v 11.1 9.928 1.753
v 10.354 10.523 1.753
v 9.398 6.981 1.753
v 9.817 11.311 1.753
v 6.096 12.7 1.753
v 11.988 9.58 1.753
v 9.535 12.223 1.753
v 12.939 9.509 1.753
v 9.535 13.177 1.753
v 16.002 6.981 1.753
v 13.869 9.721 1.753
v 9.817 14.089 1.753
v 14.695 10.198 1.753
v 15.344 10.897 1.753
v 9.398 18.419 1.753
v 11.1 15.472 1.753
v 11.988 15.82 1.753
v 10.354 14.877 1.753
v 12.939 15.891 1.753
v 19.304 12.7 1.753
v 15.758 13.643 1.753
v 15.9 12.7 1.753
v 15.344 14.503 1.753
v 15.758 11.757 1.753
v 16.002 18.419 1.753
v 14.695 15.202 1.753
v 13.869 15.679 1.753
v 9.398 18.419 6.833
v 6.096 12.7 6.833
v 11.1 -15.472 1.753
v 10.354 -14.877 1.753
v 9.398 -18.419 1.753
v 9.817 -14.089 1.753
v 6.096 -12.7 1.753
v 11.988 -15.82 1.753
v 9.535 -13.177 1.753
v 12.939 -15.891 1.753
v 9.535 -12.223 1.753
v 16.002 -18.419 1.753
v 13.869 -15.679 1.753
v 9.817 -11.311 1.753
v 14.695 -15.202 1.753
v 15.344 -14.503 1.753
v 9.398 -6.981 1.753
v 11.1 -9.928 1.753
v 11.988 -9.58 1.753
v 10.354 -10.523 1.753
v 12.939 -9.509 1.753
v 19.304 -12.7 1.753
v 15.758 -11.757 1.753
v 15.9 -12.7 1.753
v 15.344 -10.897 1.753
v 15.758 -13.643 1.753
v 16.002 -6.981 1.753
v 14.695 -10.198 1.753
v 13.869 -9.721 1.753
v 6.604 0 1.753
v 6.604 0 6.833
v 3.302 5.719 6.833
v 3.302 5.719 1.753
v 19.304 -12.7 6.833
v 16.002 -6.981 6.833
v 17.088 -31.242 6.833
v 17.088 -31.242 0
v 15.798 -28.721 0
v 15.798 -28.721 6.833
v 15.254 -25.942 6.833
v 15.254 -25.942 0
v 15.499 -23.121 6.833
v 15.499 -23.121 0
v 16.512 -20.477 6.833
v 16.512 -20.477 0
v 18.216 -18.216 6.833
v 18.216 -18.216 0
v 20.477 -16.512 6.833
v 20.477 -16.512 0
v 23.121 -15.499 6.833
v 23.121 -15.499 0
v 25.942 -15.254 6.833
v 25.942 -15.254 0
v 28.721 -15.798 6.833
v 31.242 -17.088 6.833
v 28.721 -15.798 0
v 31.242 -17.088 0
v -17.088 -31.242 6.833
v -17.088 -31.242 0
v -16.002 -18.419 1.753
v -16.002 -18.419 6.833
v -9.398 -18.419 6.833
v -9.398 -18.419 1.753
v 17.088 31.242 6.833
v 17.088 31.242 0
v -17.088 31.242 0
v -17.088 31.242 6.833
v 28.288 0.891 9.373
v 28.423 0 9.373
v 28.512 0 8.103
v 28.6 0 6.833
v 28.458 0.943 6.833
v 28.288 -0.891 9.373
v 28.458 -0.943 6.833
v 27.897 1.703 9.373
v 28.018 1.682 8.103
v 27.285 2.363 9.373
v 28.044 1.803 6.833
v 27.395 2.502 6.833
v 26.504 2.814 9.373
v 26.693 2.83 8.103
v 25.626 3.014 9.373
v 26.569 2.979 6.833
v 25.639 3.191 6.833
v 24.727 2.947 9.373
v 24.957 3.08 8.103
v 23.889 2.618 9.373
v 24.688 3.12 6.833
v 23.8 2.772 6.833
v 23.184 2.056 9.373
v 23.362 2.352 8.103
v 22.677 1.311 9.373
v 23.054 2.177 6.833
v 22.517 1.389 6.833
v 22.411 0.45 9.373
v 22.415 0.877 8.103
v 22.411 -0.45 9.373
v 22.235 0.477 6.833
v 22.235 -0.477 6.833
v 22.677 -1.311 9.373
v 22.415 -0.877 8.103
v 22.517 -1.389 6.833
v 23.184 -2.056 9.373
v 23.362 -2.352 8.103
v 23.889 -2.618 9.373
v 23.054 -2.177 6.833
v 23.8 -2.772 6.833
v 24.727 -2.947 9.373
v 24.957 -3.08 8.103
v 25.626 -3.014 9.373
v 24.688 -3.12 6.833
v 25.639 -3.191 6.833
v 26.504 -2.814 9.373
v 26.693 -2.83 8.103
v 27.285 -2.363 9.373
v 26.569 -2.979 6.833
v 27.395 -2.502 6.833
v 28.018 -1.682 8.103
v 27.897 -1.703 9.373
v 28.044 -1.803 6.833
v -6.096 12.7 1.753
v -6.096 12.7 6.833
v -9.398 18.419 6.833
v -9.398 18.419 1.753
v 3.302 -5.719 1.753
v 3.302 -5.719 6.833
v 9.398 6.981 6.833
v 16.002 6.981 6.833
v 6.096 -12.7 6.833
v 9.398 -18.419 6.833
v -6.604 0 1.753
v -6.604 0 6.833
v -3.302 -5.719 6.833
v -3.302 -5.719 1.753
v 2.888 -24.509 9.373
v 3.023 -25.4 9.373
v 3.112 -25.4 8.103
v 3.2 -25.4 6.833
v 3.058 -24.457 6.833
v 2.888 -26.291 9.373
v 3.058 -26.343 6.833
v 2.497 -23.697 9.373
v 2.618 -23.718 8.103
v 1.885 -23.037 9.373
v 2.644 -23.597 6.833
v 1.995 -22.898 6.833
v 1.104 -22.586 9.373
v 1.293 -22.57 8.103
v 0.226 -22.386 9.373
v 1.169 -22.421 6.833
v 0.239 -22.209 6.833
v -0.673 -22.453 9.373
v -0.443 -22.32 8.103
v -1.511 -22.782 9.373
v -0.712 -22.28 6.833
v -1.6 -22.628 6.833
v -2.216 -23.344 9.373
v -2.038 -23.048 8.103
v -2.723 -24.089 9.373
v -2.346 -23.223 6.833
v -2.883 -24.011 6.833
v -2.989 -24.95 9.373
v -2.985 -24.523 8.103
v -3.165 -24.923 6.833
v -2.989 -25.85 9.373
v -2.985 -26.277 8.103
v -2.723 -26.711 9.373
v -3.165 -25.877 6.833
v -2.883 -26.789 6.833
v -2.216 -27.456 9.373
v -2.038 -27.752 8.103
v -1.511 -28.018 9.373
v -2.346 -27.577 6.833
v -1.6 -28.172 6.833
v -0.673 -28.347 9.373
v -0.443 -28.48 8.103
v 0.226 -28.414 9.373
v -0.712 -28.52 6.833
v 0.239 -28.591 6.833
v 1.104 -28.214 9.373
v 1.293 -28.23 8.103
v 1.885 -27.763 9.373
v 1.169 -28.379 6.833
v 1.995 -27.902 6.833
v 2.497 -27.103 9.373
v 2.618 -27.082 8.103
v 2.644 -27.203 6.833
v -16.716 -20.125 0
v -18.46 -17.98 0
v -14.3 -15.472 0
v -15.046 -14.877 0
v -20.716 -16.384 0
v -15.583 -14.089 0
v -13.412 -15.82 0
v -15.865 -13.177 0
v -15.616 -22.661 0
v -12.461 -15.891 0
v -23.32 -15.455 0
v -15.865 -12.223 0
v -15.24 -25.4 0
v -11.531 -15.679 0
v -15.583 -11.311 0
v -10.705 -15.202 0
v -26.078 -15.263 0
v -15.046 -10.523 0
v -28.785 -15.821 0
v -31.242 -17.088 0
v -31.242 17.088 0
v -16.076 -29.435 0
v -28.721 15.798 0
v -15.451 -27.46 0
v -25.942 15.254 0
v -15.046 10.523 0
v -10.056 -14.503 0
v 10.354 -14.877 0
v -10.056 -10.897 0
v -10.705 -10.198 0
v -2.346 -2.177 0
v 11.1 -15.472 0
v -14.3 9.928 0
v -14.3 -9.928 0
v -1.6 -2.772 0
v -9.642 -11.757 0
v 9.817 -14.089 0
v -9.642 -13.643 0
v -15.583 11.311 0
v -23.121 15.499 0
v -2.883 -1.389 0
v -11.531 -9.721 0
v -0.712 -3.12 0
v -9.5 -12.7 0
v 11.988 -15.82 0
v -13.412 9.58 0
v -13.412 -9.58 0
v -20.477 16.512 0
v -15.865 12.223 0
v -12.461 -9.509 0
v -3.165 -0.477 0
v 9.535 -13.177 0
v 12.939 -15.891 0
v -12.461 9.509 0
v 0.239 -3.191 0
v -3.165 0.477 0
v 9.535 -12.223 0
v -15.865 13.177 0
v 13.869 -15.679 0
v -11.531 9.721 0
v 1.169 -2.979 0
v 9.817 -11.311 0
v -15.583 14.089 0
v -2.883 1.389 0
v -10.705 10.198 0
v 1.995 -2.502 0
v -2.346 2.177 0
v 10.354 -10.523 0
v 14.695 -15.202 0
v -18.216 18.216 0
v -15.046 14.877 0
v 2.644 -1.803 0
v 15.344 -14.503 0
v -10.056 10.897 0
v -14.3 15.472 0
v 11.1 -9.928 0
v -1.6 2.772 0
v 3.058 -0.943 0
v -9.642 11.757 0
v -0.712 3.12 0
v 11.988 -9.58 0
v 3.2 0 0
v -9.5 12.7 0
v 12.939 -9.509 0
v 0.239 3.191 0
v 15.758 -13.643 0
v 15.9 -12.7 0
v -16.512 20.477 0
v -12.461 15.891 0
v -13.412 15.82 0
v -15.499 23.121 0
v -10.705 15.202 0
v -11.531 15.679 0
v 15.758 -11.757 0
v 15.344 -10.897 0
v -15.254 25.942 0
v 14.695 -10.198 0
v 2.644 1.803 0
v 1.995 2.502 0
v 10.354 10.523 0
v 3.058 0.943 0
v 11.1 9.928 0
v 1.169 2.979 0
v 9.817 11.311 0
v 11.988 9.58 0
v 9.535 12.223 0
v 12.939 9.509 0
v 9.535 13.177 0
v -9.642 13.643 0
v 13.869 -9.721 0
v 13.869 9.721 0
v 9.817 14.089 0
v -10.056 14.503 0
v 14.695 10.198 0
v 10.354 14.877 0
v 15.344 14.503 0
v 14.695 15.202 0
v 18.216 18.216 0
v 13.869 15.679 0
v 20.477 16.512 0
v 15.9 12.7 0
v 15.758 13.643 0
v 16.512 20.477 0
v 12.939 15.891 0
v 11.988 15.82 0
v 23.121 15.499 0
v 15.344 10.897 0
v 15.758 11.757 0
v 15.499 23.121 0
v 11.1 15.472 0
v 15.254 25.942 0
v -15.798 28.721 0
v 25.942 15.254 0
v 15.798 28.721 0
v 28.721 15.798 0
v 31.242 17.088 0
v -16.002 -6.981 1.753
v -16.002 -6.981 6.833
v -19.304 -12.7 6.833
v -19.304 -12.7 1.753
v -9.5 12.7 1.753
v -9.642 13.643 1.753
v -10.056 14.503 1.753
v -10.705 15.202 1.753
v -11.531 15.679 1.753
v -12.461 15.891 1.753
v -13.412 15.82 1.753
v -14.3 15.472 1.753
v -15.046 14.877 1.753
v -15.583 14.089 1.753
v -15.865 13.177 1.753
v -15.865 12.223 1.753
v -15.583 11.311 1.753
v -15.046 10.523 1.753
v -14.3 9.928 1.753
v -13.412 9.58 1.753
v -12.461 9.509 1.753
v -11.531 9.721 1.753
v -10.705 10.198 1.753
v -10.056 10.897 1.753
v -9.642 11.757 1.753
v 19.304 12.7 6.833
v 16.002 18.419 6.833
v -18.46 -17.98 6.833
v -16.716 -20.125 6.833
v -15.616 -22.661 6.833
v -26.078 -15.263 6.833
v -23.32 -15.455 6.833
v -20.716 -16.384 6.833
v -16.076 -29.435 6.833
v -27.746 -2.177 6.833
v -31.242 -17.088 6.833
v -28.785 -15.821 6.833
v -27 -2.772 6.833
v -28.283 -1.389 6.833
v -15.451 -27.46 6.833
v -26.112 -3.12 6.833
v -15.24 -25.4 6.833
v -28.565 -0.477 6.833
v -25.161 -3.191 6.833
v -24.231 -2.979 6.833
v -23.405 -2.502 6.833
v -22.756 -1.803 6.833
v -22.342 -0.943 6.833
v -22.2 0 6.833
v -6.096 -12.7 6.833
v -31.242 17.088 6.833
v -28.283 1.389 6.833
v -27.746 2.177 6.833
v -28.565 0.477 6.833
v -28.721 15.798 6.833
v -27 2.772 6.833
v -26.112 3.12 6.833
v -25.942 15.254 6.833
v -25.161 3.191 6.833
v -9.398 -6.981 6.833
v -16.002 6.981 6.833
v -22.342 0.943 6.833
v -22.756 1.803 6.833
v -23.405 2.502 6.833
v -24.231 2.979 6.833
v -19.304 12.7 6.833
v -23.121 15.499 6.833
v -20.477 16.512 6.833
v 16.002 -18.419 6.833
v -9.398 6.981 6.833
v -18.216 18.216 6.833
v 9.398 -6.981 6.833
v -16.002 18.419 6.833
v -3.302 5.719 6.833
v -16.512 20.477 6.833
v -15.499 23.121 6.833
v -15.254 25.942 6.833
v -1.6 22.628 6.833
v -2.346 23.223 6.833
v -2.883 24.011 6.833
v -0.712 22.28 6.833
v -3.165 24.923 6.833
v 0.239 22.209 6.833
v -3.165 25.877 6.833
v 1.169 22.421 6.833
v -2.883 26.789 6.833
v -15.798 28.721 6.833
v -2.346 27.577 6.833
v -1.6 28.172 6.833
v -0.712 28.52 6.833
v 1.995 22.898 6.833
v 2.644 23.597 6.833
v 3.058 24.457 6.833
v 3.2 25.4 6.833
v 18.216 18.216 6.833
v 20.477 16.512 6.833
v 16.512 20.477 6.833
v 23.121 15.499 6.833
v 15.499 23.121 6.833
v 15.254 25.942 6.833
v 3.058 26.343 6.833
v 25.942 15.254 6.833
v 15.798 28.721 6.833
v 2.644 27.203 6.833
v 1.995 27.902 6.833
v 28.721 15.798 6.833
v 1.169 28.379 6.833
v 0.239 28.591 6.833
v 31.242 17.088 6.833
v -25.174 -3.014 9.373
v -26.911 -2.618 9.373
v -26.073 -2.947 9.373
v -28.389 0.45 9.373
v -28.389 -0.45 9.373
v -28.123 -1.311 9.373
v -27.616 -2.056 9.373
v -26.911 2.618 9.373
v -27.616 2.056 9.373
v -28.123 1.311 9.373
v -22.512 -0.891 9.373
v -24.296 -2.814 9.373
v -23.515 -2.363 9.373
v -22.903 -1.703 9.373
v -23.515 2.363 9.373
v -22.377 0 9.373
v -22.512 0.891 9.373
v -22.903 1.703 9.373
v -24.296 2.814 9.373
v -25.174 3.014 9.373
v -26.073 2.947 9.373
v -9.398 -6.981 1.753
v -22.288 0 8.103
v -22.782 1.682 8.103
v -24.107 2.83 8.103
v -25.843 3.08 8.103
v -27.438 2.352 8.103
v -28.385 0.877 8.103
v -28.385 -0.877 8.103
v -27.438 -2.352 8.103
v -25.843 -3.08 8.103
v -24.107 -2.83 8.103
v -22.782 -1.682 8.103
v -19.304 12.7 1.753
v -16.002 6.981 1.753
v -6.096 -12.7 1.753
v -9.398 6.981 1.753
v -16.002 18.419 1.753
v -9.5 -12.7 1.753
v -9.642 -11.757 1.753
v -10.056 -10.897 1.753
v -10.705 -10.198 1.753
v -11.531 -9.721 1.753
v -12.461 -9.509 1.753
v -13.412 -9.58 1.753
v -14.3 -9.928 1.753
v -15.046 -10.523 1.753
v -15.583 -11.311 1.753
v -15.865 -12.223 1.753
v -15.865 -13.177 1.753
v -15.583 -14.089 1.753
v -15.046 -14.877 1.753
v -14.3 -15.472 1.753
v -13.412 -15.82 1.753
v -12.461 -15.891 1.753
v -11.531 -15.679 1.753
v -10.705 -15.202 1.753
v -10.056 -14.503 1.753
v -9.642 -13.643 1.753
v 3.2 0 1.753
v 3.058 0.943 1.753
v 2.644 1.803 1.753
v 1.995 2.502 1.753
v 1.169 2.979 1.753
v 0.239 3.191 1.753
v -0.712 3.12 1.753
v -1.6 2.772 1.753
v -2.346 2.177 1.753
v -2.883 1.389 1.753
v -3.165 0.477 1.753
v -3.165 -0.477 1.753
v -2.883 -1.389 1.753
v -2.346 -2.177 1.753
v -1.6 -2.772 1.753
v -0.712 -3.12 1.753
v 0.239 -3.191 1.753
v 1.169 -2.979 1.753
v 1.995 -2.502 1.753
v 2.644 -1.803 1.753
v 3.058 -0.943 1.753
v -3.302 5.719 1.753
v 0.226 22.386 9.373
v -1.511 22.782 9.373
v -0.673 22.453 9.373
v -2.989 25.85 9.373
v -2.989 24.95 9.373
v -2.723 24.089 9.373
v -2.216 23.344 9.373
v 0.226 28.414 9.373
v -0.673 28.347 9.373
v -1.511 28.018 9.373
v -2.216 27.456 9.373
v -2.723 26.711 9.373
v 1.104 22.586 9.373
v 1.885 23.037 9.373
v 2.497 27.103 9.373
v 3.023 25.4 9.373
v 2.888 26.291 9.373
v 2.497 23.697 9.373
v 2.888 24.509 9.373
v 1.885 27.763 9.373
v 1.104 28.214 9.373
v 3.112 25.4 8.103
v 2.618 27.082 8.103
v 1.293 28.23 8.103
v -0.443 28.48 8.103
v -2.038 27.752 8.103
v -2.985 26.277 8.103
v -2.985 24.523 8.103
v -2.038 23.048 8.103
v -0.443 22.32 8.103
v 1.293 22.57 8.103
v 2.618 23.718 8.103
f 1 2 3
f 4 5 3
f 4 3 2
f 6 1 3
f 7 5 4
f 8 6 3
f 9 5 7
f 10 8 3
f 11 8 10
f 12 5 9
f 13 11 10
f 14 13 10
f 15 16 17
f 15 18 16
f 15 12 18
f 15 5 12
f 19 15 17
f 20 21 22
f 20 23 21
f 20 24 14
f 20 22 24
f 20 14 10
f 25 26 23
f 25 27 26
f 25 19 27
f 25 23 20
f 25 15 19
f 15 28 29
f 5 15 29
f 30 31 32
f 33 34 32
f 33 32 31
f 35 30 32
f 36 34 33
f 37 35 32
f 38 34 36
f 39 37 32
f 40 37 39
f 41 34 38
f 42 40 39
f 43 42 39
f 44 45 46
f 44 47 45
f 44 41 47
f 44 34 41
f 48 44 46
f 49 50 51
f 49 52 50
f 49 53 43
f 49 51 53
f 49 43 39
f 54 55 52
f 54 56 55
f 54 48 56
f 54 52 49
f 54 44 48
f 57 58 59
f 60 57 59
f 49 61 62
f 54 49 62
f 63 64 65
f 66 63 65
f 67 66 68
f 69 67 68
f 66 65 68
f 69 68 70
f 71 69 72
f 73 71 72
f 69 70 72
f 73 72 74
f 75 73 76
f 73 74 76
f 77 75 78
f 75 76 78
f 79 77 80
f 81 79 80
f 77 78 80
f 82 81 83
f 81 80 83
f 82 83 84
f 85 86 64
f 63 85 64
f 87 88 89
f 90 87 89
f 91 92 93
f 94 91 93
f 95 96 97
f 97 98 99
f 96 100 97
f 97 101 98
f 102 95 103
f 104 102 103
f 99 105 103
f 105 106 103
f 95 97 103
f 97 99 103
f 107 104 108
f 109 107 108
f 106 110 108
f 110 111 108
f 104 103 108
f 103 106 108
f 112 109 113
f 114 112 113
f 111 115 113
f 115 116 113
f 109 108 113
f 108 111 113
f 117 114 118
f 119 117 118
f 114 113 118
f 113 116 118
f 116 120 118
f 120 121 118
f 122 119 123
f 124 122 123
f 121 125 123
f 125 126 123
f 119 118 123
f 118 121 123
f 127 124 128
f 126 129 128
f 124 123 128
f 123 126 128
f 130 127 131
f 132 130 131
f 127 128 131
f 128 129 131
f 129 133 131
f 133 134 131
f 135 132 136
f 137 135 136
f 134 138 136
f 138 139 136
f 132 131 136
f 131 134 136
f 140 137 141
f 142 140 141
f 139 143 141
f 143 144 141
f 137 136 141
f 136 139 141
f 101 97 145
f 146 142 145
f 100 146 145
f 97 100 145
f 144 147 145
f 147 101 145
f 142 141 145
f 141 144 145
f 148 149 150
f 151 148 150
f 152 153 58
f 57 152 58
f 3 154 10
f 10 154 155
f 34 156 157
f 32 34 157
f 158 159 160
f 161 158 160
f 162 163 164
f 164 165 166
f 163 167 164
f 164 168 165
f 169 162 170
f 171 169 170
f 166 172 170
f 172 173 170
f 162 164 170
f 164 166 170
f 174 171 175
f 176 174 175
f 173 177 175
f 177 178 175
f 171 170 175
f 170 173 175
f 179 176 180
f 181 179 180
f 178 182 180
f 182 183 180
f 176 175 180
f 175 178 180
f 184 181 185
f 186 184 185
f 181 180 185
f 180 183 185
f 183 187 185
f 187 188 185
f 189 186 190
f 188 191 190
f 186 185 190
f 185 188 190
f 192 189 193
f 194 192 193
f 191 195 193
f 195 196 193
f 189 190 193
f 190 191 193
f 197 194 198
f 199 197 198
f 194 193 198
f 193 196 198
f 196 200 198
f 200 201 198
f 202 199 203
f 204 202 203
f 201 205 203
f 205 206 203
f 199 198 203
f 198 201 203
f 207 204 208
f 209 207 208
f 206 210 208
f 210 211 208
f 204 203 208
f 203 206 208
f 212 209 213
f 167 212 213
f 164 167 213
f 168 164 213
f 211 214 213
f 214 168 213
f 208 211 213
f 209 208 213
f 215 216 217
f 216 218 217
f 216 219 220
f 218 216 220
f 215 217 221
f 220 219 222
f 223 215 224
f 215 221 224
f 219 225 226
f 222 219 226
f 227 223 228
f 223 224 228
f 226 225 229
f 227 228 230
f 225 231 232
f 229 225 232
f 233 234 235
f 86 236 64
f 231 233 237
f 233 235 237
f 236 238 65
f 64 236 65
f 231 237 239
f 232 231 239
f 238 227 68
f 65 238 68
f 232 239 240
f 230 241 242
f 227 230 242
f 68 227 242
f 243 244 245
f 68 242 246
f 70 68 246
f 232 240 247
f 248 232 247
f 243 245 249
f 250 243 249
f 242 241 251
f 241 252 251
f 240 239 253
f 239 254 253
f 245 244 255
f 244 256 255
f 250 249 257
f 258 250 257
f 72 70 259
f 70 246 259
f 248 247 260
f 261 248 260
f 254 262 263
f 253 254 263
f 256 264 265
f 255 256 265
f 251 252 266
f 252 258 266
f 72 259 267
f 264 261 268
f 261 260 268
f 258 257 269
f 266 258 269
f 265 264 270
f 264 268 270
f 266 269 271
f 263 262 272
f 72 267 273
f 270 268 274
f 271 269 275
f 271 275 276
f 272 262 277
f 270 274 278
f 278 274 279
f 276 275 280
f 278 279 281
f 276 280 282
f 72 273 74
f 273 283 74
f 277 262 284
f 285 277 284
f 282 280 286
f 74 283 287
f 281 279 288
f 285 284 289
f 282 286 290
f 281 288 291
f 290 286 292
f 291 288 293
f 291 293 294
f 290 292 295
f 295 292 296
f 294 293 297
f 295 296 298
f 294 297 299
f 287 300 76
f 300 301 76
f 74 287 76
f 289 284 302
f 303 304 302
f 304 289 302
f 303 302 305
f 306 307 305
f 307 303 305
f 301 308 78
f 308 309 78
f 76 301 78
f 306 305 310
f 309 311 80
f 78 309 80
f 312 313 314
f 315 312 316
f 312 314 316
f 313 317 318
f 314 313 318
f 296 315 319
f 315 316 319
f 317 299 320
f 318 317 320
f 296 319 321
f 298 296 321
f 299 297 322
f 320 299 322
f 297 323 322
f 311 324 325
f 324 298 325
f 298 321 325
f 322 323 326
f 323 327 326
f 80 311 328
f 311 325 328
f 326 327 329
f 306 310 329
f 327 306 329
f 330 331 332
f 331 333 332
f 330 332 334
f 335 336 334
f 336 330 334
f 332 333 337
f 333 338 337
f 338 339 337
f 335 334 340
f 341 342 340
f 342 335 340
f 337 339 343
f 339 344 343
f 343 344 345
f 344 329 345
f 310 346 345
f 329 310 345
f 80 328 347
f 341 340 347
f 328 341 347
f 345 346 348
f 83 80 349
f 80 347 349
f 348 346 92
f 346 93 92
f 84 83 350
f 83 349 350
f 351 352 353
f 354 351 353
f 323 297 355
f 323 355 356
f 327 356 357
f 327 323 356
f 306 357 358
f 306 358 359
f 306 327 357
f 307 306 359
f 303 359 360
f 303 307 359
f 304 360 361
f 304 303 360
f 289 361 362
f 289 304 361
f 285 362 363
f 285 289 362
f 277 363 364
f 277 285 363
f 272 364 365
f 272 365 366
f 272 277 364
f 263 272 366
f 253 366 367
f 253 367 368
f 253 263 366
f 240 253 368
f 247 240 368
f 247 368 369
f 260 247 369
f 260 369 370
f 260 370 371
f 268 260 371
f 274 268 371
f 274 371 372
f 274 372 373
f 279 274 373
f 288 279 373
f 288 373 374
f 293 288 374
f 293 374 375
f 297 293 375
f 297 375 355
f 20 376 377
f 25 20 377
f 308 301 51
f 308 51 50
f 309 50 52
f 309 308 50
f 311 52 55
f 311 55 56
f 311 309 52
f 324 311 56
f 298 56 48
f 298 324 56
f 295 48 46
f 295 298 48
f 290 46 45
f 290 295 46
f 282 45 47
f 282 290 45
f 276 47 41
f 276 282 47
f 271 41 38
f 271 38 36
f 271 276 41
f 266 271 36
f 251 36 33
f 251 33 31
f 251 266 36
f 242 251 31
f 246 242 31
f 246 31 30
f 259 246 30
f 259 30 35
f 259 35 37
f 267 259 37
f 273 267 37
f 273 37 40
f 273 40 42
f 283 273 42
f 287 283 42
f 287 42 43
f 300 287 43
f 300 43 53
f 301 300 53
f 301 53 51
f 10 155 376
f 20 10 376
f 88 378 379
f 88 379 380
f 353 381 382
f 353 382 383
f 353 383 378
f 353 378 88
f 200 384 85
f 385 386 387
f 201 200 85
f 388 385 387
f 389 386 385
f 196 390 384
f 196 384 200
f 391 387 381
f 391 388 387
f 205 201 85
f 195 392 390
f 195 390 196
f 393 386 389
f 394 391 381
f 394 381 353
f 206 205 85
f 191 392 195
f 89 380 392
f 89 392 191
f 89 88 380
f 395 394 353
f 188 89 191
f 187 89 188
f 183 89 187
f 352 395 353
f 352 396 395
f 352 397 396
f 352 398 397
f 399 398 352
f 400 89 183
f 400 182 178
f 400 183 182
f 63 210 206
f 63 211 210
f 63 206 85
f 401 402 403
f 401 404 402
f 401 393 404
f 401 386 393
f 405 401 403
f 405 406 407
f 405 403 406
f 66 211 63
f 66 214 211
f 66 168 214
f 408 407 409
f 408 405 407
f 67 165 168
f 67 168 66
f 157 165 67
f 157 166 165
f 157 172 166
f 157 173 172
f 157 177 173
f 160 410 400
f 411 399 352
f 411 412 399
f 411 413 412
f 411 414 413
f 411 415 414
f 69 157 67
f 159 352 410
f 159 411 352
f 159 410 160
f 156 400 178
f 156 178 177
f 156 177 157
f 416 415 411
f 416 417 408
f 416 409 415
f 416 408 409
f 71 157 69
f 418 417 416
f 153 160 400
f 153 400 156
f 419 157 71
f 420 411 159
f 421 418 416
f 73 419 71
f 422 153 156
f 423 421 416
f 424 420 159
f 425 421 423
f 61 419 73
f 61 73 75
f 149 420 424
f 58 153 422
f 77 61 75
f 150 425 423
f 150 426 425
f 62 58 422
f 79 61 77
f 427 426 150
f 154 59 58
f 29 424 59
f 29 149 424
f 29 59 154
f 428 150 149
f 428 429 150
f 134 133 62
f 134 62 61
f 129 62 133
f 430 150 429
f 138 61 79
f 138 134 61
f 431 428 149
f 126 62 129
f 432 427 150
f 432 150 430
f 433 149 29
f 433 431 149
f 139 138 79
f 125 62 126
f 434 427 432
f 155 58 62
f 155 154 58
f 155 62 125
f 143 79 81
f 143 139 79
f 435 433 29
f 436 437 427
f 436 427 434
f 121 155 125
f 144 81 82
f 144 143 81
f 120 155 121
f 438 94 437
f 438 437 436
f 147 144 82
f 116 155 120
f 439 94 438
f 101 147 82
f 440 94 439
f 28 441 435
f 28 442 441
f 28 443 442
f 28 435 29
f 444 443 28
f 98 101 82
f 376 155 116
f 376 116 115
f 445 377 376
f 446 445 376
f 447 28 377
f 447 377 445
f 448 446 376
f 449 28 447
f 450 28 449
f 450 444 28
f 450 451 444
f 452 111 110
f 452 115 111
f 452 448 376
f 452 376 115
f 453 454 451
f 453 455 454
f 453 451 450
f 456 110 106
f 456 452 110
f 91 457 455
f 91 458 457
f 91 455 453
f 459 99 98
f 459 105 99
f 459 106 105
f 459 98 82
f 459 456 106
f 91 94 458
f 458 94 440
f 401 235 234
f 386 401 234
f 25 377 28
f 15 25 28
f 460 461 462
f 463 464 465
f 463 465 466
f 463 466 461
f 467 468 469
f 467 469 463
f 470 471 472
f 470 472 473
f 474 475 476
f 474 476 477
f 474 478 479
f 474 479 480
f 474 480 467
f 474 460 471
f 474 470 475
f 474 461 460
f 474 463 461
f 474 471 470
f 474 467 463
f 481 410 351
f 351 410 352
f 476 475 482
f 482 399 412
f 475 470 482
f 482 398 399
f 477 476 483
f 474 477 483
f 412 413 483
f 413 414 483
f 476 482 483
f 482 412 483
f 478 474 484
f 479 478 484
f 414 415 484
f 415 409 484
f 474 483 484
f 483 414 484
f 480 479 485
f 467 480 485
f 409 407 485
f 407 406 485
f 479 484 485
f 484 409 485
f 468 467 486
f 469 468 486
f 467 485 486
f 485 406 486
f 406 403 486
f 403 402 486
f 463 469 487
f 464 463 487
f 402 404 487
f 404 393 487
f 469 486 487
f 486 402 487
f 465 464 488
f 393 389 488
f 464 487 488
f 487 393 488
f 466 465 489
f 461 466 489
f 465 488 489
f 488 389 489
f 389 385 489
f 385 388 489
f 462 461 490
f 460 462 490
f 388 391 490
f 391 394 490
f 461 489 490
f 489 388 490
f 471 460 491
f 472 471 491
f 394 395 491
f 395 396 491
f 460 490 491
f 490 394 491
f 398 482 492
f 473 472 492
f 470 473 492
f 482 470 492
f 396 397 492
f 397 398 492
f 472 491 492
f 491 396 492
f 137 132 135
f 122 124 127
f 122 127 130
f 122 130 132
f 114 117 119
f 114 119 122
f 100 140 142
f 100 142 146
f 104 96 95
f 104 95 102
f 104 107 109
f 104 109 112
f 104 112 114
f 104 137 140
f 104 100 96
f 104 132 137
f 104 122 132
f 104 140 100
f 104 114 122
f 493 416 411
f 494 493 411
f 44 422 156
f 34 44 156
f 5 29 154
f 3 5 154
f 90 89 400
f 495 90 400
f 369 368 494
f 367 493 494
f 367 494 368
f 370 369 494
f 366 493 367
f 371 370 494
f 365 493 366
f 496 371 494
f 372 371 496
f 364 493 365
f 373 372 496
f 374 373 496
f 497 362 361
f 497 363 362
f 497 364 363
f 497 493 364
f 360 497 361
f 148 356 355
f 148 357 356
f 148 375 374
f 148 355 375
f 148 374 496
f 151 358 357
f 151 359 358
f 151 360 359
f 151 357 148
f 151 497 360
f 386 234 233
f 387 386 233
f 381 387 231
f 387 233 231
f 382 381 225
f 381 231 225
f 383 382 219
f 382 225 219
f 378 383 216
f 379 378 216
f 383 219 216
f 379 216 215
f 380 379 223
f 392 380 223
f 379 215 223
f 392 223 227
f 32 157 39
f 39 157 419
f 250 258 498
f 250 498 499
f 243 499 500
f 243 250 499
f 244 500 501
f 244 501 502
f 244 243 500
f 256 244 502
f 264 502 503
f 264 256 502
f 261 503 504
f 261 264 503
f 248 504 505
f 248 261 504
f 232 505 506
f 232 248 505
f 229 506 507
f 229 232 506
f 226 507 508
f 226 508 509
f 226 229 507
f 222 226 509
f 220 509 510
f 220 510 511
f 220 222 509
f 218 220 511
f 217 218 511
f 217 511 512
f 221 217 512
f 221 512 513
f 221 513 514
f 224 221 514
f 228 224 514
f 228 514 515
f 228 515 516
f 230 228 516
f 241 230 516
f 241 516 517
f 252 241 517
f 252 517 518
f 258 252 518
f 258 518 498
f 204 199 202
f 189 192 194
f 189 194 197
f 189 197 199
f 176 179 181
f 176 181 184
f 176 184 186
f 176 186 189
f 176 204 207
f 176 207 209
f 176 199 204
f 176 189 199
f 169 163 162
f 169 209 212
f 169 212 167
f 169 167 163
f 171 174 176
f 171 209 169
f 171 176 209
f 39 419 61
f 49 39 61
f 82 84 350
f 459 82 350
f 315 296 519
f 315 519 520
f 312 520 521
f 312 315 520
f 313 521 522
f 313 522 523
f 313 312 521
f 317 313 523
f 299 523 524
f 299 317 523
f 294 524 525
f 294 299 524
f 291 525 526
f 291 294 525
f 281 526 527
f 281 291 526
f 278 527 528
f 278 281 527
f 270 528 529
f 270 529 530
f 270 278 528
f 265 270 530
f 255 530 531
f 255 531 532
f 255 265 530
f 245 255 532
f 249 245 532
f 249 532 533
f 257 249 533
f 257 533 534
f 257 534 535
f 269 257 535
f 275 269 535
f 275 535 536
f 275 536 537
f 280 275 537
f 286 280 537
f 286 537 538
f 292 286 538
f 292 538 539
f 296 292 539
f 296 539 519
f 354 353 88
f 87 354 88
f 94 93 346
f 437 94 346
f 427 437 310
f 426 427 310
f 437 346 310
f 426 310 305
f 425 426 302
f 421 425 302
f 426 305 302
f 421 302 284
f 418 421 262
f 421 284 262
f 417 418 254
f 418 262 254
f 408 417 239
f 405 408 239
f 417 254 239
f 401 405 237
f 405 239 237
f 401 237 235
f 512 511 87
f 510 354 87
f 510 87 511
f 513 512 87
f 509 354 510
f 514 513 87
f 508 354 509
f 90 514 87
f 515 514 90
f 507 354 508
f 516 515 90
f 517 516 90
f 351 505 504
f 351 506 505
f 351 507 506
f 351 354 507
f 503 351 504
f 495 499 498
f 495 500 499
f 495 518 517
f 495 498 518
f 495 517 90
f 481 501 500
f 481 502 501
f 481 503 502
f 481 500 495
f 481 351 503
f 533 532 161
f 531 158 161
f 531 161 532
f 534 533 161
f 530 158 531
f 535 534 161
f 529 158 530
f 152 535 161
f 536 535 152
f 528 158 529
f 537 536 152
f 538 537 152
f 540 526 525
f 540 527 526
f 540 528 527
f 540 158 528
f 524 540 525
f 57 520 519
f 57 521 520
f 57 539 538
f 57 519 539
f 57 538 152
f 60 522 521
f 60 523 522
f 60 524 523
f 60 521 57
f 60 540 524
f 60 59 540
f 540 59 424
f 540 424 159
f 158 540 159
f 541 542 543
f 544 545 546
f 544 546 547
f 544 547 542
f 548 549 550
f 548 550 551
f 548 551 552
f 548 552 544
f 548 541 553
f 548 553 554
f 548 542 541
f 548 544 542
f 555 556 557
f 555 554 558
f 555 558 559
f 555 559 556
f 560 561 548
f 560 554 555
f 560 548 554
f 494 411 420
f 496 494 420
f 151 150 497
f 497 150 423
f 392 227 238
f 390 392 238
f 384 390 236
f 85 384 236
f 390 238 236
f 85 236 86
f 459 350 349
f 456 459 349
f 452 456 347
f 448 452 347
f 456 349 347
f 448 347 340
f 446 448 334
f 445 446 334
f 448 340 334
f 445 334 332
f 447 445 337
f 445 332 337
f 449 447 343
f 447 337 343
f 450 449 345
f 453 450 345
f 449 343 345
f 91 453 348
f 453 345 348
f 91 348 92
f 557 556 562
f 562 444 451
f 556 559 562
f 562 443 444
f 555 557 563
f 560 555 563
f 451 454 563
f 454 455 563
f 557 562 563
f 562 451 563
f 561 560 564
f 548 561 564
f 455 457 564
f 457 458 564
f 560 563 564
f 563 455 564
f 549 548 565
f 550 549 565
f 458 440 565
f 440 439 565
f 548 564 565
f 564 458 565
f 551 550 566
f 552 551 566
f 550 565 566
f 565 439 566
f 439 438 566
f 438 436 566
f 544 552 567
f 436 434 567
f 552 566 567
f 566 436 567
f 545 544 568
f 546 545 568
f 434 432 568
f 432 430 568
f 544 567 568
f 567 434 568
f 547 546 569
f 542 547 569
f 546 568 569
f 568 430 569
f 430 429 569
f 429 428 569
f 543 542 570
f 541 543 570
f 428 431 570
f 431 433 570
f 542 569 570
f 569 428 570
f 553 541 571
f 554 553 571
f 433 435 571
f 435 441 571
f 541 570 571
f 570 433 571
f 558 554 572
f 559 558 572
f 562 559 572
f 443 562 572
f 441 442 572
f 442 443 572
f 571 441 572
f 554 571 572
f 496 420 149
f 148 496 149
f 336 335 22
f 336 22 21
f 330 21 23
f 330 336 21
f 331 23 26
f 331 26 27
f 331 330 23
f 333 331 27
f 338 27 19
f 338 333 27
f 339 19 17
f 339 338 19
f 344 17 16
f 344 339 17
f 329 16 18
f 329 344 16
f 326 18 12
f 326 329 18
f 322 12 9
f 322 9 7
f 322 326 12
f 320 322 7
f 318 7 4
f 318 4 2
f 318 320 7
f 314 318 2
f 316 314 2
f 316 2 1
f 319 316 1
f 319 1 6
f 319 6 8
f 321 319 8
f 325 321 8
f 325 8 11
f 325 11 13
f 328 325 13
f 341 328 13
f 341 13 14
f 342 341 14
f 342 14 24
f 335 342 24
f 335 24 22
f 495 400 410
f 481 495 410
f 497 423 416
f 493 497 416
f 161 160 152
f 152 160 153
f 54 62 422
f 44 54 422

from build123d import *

# Parameters (mm, degrees)
F0_R       = 3.2004
F0_R_2     = 6.858
F1_DEPTH   = 6.8326
F2_DEPTH   = 9.3726
F3_R       = 3.2004
F4_DEPTH   = 5.08
F5_SIZE2   = 2.53999
F5_SIZE    = 0.17779
F5_2_SIZE2 = 2.53999
F5_2_SIZE  = 0.17779
F5_3_SIZE2 = 2.53999
F5_3_SIZE  = 0.17779
F5_4_SIZE2 = 2.53999
F5_4_SIZE  = 0.17779


# Not quite as in the source:
# - a fillet or chamfer is up to 0.001 mm smaller than in the source, because OpenCascade refuses the exact size


with BuildPart() as f1:
    # F0 (on Top) → F1 (new body)
    with BuildSketch(Plane.XY):
        with BuildLine():
            ThreePointArc((-31.242, -17.0875613686), (-20.7164714157, -16.3838944106), (-15.24, -25.4))
            ThreePointArc((-15.24, -25.4), (-15.712895776, -28.4635945803), (-17.0875613686, -31.242))
            Line((-17.0875613686, -31.242), (17.0875613686, -31.242))
            ThreePointArc((17.0875613686, -31.242), (18.2157951031, -18.2157951031), (31.242, -17.0875613686))
            Line((31.242, -17.0875613686), (31.242, 17.0875613686))
            ThreePointArc((31.242, 17.0875613686), (18.2157951031, 18.2157951031), (17.0875613686, 31.242))
            Line((17.0875613686, 31.242), (-17.0875613686, 31.242))
            ThreePointArc((-17.0875613686, 31.242), (-18.2157951031, 18.2157951031), (-31.242, 17.0875613686))
            Line((-31.242, 17.0875613686), (-31.242, -17.0875613686))
        make_face()
        with Locations((0, -25.4)):
            Circle(F0_R, mode=Mode.SUBTRACT)
        with Locations((-25.4, 0)):
            Circle(F0_R, mode=Mode.SUBTRACT)
        with Locations((-12.7, -12.7)):
            Circle(F0_R, mode=Mode.SUBTRACT)
        Circle(F0_R_2, mode=Mode.SUBTRACT)
        with Locations((12.7, -12.7)):
            Circle(F0_R, mode=Mode.SUBTRACT)
        with Locations((25.4, 0)):
            Circle(F0_R, mode=Mode.SUBTRACT)
        with Locations((-12.7, 12.7)):
            Circle(F0_R, mode=Mode.SUBTRACT)
        with Locations((0, 25.4)):
            Circle(F0_R, mode=Mode.SUBTRACT)
        with Locations((12.7, 12.7)):
            Circle(F0_R, mode=Mode.SUBTRACT)
        Circle(F0_R_2)
        Circle(F0_R, mode=Mode.SUBTRACT)
    extrude(amount=F1_DEPTH)

    # F0 (on Top) → F2 (join)
    with BuildSketch(Plane.XY):
        with Locations((-25.4, 0)):
            Circle(F0_R)
        with Locations((0, -25.4)):
            Circle(F0_R)
        with Locations((25.4, 0)):
            Circle(F0_R)
        with Locations((0, 25.4)):
            Circle(F0_R)
    extrude(amount=F2_DEPTH)

    # F3 (on face) → F4 (cut)
    with BuildSketch(Plane.XY.offset(6.8326)):
        Polygon((-9.398, 6.9807682334), (-6.096, 12.7), (-9.398, 18.4192317666), (-16.002, 18.4192317666), (-19.304, 12.7), (-16.002, 6.9807682334), align=None)
        with Locations((-12.7, 12.7)):
            Circle(F3_R, mode=Mode.SUBTRACT)
        Polygon((9.398, 18.4192317666), (6.096, 12.7), (9.398, 6.9807682334), (16.002, 6.9807682334), (19.304, 12.7), (16.002, 18.4192317666), align=None)
        with Locations((12.7, 12.7)):
            Circle(F3_R, mode=Mode.SUBTRACT)
        Polygon((-9.398, -18.4192317666), (-6.096, -12.7), (-9.398, -6.9807682334), (-16.002, -6.9807682334), (-19.304, -12.7), (-16.002, -18.4192317666), align=None)
        with Locations((-12.7, -12.7)):
            Circle(F3_R, mode=Mode.SUBTRACT)
        Polygon((9.398, -6.9807682334), (6.096, -12.7), (9.398, -18.4192317666), (16.002, -18.4192317666), (19.304, -12.7), (16.002, -6.9807682334), align=None)
        with Locations((12.7, -12.7)):
            Circle(F3_R, mode=Mode.SUBTRACT)
        Polygon((3.302, -5.7192317666), (6.604, 0), (3.302, 5.7192317666), (-3.302, 5.7192317666), (-6.604, 0), (-3.302, -5.7192317666), align=None)
        Circle(F3_R, mode=Mode.SUBTRACT)
    extrude(amount=-F4_DEPTH, mode=Mode.SUBTRACT)

    # F5 (size 0.1778 and 2.54 in the source; OpenCascade refuses exactly that, so slightly less here)
    f5_edges = [f1.edges().sort_by_distance(p)[0] for p in [
        (-28.6004, 0, 9.3726),
    ]]
    f5_side = f1.faces().sort_by_distance((-25.4, 0, 9.3726))[0]
    chamfer(f5_edges, length=F5_SIZE, length2=F5_SIZE2, reference=f5_side)

    # F5#2 (size 0.1778 and 2.54 in the source; OpenCascade refuses exactly that, so slightly less here)
    f5_2_edges = [f1.edges().sort_by_distance(p)[0] for p in [
        (-3.2004, 25.4, 9.3726),
    ]]
    f5_2_side = f1.faces().sort_by_distance((0, 25.4, 9.3726))[0]
    chamfer(f5_2_edges, length=F5_2_SIZE, length2=F5_2_SIZE2, reference=f5_2_side)

    # F5#3 (size 0.1778 and 2.54 in the source; OpenCascade refuses exactly that, so slightly less here)
    f5_3_edges = [f1.edges().sort_by_distance(p)[0] for p in [
        (22.1996, 0, 9.3726),
    ]]
    f5_3_side = f1.faces().sort_by_distance((25.4, 0, 9.3726))[0]
    chamfer(f5_3_edges, length=F5_3_SIZE, length2=F5_3_SIZE2, reference=f5_3_side)

    # F5#4 (size 0.1778 and 2.54 in the source; OpenCascade refuses exactly that, so slightly less here)
    f5_4_edges = [f1.edges().sort_by_distance(p)[0] for p in [
        (-3.2004, -25.4, 9.3726),
    ]]
    f5_4_side = f1.faces().sort_by_distance((0, -25.4, 9.3726))[0]
    chamfer(f5_4_edges, length=F5_4_SIZE, length2=F5_4_SIZE2, reference=f5_4_side)


solid = f1.part
